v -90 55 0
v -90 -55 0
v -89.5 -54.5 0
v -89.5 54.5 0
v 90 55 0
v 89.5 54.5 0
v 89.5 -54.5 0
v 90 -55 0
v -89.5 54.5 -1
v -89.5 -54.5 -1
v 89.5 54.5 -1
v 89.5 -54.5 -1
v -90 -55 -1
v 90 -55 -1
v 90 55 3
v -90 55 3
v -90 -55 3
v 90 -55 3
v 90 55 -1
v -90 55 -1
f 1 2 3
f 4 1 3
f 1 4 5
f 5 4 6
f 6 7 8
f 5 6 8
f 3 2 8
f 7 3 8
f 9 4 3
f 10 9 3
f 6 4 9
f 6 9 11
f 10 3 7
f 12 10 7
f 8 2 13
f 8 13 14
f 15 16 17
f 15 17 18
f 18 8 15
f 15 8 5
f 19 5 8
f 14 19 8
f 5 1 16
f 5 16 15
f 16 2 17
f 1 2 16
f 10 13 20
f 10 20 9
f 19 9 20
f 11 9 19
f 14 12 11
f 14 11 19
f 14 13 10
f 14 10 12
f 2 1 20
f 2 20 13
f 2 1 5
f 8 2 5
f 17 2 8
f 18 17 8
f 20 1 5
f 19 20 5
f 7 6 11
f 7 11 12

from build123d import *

# Parameters (mm, degrees)
F0_W     = 180
F0_H     = 110
F1_DEPTH = 3
F2_W     = 180
F2_H     = 110
F2_W_2   = 179
F2_H_2   = 109
F3_DEPTH = 1


with BuildPart() as f1:
    # F0 (on Top) → F1 (new body)
    with BuildSketch(Plane.XY):
        Rectangle(F0_W, F0_H)
    extrude(amount=F1_DEPTH)


with BuildPart() as f3:
    # F2 (on face) → F3 (new body)
    with BuildSketch(Plane(origin=(0, 0, 0), x_dir=(1, 0, 0), z_dir=(0, 0, -1))):
        Rectangle(F2_W, F2_H)
        Rectangle(F2_W_2, F2_H_2, mode=Mode.SUBTRACT)
    extrude(amount=F3_DEPTH)


solid = Compound([f1.part, f3.part])
